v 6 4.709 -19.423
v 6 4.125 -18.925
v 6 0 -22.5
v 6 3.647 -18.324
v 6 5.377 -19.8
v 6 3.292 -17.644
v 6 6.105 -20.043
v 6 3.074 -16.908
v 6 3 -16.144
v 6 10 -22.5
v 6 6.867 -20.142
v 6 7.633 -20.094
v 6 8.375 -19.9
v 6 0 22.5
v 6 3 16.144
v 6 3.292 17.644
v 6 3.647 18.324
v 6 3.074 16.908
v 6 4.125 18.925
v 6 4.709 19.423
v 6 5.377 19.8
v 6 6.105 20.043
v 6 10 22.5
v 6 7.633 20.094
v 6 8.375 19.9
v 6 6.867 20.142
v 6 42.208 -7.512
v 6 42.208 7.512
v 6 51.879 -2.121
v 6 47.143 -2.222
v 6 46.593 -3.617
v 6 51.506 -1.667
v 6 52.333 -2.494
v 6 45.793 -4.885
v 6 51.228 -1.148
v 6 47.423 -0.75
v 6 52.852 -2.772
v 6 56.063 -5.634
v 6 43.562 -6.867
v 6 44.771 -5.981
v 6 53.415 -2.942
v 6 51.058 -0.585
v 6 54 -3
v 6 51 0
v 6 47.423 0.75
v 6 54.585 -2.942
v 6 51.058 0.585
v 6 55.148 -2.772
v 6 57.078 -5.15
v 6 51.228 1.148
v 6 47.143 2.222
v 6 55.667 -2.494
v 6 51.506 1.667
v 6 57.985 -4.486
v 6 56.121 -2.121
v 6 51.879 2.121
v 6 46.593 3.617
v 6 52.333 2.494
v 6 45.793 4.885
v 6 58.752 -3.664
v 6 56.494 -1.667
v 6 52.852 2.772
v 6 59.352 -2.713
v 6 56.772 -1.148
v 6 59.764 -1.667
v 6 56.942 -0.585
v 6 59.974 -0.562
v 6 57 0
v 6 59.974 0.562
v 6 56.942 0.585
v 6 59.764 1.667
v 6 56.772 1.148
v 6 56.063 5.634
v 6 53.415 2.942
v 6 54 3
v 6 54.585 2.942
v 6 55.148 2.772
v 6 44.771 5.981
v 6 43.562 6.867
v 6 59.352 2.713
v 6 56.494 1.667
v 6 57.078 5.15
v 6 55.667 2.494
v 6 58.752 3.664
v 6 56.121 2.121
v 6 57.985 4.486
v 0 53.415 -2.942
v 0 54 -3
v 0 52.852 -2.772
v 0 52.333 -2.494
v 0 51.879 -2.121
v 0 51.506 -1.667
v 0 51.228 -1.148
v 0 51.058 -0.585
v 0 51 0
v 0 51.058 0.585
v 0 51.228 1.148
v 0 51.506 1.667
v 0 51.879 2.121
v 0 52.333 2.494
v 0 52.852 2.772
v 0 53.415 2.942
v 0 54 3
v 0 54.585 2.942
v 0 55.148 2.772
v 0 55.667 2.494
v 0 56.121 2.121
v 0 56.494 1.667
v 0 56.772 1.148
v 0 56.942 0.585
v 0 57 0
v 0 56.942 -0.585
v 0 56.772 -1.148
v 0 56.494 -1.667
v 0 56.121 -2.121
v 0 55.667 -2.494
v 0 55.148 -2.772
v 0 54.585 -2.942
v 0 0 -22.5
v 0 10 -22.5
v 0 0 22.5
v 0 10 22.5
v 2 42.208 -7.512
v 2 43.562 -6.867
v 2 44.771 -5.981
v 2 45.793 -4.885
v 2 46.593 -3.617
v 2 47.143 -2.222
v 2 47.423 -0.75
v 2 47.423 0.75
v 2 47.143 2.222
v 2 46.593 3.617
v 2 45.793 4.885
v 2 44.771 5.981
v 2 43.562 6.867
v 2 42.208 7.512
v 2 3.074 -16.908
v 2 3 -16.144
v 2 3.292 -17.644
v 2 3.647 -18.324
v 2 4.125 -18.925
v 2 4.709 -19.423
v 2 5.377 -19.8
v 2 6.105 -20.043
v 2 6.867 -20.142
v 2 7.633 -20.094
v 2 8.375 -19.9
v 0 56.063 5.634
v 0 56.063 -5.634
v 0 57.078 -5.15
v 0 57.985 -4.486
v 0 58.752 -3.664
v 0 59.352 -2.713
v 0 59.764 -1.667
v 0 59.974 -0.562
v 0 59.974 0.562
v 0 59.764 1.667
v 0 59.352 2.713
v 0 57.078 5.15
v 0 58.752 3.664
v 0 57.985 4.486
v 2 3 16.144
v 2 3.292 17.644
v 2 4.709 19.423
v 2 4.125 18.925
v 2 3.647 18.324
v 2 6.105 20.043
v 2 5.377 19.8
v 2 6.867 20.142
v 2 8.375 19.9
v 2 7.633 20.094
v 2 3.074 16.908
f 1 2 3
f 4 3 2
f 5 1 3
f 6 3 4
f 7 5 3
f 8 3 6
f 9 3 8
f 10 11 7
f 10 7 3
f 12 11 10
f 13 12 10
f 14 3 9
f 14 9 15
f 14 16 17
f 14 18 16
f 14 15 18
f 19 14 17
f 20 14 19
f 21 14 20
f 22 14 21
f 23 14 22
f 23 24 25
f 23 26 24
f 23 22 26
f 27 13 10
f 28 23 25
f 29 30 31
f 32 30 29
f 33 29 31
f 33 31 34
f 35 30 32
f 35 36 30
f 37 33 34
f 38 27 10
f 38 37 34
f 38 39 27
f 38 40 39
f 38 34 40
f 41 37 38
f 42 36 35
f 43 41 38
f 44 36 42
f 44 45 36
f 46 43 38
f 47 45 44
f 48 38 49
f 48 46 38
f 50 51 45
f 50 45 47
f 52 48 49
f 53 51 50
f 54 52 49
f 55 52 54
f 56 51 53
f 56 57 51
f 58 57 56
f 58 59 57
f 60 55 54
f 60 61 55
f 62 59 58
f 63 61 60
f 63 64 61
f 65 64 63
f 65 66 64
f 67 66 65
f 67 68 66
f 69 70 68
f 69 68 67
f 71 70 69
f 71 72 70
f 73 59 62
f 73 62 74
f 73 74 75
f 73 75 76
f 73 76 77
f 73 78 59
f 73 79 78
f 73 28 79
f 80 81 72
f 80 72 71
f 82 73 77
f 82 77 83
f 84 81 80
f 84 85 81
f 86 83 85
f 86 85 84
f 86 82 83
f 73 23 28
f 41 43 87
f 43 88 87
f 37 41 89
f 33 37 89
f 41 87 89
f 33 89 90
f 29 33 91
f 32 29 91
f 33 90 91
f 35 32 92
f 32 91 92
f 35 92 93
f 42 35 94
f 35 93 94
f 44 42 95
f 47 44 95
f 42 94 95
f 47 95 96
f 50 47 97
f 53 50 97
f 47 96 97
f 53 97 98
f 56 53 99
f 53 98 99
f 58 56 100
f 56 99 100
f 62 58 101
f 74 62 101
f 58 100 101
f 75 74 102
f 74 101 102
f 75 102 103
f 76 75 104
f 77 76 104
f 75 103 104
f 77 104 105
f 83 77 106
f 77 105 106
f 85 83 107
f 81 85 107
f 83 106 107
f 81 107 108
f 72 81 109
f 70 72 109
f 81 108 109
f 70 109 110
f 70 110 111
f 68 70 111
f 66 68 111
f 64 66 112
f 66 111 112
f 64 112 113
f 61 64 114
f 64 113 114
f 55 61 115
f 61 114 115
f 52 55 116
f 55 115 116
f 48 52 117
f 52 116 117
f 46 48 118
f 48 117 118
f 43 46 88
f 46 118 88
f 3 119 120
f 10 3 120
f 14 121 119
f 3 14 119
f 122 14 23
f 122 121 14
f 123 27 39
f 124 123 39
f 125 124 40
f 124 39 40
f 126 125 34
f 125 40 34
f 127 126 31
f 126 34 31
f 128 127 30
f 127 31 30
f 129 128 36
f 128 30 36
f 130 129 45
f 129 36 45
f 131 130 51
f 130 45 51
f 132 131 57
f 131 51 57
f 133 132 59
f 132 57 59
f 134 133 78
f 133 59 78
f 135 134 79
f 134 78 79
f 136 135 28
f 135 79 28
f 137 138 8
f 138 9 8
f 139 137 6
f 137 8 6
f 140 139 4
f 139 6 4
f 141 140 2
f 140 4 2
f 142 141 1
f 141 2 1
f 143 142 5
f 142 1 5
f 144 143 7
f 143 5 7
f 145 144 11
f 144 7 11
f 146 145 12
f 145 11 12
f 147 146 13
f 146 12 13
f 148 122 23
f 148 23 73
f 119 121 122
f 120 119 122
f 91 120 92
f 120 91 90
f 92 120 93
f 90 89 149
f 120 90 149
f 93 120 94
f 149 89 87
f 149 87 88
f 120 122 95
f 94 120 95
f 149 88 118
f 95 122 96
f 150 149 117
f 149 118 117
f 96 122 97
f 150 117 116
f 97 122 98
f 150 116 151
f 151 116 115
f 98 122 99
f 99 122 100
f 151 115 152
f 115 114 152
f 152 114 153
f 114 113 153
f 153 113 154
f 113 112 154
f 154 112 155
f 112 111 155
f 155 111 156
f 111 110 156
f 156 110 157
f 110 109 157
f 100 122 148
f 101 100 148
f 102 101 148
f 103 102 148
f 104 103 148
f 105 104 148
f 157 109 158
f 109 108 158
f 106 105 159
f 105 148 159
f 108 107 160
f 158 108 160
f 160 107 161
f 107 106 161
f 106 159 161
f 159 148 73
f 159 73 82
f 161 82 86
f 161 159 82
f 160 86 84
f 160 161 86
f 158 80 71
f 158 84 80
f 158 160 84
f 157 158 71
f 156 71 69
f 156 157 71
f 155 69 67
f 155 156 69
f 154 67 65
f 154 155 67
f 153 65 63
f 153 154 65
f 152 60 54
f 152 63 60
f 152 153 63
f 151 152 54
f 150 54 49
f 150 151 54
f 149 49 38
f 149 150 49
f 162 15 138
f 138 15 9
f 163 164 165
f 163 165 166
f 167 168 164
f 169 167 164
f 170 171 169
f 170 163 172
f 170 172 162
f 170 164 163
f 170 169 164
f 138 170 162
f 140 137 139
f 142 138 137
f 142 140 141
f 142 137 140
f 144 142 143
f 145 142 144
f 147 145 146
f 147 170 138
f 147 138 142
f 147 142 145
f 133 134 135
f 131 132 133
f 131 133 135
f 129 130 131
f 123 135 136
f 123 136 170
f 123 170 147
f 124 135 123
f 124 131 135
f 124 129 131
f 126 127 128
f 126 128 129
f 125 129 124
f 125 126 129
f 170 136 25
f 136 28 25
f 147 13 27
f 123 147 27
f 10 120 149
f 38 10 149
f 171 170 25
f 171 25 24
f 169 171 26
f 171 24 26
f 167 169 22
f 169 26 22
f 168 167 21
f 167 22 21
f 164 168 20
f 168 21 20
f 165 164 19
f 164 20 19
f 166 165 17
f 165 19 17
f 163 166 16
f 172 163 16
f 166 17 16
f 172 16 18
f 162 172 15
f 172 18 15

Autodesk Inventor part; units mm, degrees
ref_plane "YZ Plane" through (0, 0, 0) normal (1, 0, 0) x (0, 1, 0)
ref_plane "XZ Plane" through (0, 0, 0) normal (0, 1, 0) x (-1, 0, 0)
ref_plane "XY Plane" through (0, 0, 0) normal (0, 0, 1) x (1, 0, 0)
sketch "Sketch1" plane through (0, 0, 0) normal (1, 0, 0) x (0, 1, 0)
  line L0 (0, 22.5) -> (0, -22.5)
  arc A0 (56.0629, -5.6342) -> (56.0629, 5.6342) centre (54, 0) ccw
  line L1 (0, 22.5) -> (10, 22.5)
  line L2 (0, -22.5) -> (10, -22.5)
  line L3 (10, -22.5) -> (56.0629, -5.6342)
  line L4 (10, 22.5) -> (56.0629, 5.6342)
  point P0 (0, 0)
  dimension "d1" = 6
  dimension "d2" = 10
  dimension "d3" = 54
  dimension "d4" = 45
extrude "Extrusion1" add sketch "Sketch1" along normal blind 6
sketch "Sketch2" plane through (6, 0, 0) normal (1, 0, 0) x (0, 0, -1)
  line L0 (-22.5, 0) -> (22.5, 0) projected
  line L1 (22.5, 10) -> (5.6342, 56.0629) projected
  line L2 (-5.6342, 56.0629) -> (-22.5, 10) projected
  line L3 (-7.5123, 42.2083) -> (-19.9001, 8.3753)
  line L4 (-16.144, 3) -> (16.144, 3)
  line L5 (19.9001, 8.3753) -> (7.5123, 42.2083)
  arc A0 (7.5123, 42.2083) -> (-7.5123, 42.2083) centre (0, 39.4577) ccw
  arc A1 (-19.9001, 8.3753) -> (-16.144, 3) centre (-16.144, 7) ccw
  arc A2 (16.144, 3) -> (19.9001, 8.3753) centre (16.144, 7) ccw
  point P0 (0, 0)
  dimension "d8" = 4
  dimension "d9" = 8
  dimension "d10" = 3
  dimension "d11" = 3
  dimension "d12" = 3
extrude "Extrusion2" cut sketch "Sketch2" against normal blind 4
sketch "Sketch3" plane through (6, 0, 0) normal (1, 0, 0) x (0, 0, -1)
  arc A0 (5.6342, 56.0629) -> (-5.6342, 56.0629) centre (0, 54) ccw projected
  point P0 (0, 0)
hole "Hole1" at (6, 54, 0) direction (-1, 0, 0) diameter 6 end through all
properties part number "Bearing Short"
